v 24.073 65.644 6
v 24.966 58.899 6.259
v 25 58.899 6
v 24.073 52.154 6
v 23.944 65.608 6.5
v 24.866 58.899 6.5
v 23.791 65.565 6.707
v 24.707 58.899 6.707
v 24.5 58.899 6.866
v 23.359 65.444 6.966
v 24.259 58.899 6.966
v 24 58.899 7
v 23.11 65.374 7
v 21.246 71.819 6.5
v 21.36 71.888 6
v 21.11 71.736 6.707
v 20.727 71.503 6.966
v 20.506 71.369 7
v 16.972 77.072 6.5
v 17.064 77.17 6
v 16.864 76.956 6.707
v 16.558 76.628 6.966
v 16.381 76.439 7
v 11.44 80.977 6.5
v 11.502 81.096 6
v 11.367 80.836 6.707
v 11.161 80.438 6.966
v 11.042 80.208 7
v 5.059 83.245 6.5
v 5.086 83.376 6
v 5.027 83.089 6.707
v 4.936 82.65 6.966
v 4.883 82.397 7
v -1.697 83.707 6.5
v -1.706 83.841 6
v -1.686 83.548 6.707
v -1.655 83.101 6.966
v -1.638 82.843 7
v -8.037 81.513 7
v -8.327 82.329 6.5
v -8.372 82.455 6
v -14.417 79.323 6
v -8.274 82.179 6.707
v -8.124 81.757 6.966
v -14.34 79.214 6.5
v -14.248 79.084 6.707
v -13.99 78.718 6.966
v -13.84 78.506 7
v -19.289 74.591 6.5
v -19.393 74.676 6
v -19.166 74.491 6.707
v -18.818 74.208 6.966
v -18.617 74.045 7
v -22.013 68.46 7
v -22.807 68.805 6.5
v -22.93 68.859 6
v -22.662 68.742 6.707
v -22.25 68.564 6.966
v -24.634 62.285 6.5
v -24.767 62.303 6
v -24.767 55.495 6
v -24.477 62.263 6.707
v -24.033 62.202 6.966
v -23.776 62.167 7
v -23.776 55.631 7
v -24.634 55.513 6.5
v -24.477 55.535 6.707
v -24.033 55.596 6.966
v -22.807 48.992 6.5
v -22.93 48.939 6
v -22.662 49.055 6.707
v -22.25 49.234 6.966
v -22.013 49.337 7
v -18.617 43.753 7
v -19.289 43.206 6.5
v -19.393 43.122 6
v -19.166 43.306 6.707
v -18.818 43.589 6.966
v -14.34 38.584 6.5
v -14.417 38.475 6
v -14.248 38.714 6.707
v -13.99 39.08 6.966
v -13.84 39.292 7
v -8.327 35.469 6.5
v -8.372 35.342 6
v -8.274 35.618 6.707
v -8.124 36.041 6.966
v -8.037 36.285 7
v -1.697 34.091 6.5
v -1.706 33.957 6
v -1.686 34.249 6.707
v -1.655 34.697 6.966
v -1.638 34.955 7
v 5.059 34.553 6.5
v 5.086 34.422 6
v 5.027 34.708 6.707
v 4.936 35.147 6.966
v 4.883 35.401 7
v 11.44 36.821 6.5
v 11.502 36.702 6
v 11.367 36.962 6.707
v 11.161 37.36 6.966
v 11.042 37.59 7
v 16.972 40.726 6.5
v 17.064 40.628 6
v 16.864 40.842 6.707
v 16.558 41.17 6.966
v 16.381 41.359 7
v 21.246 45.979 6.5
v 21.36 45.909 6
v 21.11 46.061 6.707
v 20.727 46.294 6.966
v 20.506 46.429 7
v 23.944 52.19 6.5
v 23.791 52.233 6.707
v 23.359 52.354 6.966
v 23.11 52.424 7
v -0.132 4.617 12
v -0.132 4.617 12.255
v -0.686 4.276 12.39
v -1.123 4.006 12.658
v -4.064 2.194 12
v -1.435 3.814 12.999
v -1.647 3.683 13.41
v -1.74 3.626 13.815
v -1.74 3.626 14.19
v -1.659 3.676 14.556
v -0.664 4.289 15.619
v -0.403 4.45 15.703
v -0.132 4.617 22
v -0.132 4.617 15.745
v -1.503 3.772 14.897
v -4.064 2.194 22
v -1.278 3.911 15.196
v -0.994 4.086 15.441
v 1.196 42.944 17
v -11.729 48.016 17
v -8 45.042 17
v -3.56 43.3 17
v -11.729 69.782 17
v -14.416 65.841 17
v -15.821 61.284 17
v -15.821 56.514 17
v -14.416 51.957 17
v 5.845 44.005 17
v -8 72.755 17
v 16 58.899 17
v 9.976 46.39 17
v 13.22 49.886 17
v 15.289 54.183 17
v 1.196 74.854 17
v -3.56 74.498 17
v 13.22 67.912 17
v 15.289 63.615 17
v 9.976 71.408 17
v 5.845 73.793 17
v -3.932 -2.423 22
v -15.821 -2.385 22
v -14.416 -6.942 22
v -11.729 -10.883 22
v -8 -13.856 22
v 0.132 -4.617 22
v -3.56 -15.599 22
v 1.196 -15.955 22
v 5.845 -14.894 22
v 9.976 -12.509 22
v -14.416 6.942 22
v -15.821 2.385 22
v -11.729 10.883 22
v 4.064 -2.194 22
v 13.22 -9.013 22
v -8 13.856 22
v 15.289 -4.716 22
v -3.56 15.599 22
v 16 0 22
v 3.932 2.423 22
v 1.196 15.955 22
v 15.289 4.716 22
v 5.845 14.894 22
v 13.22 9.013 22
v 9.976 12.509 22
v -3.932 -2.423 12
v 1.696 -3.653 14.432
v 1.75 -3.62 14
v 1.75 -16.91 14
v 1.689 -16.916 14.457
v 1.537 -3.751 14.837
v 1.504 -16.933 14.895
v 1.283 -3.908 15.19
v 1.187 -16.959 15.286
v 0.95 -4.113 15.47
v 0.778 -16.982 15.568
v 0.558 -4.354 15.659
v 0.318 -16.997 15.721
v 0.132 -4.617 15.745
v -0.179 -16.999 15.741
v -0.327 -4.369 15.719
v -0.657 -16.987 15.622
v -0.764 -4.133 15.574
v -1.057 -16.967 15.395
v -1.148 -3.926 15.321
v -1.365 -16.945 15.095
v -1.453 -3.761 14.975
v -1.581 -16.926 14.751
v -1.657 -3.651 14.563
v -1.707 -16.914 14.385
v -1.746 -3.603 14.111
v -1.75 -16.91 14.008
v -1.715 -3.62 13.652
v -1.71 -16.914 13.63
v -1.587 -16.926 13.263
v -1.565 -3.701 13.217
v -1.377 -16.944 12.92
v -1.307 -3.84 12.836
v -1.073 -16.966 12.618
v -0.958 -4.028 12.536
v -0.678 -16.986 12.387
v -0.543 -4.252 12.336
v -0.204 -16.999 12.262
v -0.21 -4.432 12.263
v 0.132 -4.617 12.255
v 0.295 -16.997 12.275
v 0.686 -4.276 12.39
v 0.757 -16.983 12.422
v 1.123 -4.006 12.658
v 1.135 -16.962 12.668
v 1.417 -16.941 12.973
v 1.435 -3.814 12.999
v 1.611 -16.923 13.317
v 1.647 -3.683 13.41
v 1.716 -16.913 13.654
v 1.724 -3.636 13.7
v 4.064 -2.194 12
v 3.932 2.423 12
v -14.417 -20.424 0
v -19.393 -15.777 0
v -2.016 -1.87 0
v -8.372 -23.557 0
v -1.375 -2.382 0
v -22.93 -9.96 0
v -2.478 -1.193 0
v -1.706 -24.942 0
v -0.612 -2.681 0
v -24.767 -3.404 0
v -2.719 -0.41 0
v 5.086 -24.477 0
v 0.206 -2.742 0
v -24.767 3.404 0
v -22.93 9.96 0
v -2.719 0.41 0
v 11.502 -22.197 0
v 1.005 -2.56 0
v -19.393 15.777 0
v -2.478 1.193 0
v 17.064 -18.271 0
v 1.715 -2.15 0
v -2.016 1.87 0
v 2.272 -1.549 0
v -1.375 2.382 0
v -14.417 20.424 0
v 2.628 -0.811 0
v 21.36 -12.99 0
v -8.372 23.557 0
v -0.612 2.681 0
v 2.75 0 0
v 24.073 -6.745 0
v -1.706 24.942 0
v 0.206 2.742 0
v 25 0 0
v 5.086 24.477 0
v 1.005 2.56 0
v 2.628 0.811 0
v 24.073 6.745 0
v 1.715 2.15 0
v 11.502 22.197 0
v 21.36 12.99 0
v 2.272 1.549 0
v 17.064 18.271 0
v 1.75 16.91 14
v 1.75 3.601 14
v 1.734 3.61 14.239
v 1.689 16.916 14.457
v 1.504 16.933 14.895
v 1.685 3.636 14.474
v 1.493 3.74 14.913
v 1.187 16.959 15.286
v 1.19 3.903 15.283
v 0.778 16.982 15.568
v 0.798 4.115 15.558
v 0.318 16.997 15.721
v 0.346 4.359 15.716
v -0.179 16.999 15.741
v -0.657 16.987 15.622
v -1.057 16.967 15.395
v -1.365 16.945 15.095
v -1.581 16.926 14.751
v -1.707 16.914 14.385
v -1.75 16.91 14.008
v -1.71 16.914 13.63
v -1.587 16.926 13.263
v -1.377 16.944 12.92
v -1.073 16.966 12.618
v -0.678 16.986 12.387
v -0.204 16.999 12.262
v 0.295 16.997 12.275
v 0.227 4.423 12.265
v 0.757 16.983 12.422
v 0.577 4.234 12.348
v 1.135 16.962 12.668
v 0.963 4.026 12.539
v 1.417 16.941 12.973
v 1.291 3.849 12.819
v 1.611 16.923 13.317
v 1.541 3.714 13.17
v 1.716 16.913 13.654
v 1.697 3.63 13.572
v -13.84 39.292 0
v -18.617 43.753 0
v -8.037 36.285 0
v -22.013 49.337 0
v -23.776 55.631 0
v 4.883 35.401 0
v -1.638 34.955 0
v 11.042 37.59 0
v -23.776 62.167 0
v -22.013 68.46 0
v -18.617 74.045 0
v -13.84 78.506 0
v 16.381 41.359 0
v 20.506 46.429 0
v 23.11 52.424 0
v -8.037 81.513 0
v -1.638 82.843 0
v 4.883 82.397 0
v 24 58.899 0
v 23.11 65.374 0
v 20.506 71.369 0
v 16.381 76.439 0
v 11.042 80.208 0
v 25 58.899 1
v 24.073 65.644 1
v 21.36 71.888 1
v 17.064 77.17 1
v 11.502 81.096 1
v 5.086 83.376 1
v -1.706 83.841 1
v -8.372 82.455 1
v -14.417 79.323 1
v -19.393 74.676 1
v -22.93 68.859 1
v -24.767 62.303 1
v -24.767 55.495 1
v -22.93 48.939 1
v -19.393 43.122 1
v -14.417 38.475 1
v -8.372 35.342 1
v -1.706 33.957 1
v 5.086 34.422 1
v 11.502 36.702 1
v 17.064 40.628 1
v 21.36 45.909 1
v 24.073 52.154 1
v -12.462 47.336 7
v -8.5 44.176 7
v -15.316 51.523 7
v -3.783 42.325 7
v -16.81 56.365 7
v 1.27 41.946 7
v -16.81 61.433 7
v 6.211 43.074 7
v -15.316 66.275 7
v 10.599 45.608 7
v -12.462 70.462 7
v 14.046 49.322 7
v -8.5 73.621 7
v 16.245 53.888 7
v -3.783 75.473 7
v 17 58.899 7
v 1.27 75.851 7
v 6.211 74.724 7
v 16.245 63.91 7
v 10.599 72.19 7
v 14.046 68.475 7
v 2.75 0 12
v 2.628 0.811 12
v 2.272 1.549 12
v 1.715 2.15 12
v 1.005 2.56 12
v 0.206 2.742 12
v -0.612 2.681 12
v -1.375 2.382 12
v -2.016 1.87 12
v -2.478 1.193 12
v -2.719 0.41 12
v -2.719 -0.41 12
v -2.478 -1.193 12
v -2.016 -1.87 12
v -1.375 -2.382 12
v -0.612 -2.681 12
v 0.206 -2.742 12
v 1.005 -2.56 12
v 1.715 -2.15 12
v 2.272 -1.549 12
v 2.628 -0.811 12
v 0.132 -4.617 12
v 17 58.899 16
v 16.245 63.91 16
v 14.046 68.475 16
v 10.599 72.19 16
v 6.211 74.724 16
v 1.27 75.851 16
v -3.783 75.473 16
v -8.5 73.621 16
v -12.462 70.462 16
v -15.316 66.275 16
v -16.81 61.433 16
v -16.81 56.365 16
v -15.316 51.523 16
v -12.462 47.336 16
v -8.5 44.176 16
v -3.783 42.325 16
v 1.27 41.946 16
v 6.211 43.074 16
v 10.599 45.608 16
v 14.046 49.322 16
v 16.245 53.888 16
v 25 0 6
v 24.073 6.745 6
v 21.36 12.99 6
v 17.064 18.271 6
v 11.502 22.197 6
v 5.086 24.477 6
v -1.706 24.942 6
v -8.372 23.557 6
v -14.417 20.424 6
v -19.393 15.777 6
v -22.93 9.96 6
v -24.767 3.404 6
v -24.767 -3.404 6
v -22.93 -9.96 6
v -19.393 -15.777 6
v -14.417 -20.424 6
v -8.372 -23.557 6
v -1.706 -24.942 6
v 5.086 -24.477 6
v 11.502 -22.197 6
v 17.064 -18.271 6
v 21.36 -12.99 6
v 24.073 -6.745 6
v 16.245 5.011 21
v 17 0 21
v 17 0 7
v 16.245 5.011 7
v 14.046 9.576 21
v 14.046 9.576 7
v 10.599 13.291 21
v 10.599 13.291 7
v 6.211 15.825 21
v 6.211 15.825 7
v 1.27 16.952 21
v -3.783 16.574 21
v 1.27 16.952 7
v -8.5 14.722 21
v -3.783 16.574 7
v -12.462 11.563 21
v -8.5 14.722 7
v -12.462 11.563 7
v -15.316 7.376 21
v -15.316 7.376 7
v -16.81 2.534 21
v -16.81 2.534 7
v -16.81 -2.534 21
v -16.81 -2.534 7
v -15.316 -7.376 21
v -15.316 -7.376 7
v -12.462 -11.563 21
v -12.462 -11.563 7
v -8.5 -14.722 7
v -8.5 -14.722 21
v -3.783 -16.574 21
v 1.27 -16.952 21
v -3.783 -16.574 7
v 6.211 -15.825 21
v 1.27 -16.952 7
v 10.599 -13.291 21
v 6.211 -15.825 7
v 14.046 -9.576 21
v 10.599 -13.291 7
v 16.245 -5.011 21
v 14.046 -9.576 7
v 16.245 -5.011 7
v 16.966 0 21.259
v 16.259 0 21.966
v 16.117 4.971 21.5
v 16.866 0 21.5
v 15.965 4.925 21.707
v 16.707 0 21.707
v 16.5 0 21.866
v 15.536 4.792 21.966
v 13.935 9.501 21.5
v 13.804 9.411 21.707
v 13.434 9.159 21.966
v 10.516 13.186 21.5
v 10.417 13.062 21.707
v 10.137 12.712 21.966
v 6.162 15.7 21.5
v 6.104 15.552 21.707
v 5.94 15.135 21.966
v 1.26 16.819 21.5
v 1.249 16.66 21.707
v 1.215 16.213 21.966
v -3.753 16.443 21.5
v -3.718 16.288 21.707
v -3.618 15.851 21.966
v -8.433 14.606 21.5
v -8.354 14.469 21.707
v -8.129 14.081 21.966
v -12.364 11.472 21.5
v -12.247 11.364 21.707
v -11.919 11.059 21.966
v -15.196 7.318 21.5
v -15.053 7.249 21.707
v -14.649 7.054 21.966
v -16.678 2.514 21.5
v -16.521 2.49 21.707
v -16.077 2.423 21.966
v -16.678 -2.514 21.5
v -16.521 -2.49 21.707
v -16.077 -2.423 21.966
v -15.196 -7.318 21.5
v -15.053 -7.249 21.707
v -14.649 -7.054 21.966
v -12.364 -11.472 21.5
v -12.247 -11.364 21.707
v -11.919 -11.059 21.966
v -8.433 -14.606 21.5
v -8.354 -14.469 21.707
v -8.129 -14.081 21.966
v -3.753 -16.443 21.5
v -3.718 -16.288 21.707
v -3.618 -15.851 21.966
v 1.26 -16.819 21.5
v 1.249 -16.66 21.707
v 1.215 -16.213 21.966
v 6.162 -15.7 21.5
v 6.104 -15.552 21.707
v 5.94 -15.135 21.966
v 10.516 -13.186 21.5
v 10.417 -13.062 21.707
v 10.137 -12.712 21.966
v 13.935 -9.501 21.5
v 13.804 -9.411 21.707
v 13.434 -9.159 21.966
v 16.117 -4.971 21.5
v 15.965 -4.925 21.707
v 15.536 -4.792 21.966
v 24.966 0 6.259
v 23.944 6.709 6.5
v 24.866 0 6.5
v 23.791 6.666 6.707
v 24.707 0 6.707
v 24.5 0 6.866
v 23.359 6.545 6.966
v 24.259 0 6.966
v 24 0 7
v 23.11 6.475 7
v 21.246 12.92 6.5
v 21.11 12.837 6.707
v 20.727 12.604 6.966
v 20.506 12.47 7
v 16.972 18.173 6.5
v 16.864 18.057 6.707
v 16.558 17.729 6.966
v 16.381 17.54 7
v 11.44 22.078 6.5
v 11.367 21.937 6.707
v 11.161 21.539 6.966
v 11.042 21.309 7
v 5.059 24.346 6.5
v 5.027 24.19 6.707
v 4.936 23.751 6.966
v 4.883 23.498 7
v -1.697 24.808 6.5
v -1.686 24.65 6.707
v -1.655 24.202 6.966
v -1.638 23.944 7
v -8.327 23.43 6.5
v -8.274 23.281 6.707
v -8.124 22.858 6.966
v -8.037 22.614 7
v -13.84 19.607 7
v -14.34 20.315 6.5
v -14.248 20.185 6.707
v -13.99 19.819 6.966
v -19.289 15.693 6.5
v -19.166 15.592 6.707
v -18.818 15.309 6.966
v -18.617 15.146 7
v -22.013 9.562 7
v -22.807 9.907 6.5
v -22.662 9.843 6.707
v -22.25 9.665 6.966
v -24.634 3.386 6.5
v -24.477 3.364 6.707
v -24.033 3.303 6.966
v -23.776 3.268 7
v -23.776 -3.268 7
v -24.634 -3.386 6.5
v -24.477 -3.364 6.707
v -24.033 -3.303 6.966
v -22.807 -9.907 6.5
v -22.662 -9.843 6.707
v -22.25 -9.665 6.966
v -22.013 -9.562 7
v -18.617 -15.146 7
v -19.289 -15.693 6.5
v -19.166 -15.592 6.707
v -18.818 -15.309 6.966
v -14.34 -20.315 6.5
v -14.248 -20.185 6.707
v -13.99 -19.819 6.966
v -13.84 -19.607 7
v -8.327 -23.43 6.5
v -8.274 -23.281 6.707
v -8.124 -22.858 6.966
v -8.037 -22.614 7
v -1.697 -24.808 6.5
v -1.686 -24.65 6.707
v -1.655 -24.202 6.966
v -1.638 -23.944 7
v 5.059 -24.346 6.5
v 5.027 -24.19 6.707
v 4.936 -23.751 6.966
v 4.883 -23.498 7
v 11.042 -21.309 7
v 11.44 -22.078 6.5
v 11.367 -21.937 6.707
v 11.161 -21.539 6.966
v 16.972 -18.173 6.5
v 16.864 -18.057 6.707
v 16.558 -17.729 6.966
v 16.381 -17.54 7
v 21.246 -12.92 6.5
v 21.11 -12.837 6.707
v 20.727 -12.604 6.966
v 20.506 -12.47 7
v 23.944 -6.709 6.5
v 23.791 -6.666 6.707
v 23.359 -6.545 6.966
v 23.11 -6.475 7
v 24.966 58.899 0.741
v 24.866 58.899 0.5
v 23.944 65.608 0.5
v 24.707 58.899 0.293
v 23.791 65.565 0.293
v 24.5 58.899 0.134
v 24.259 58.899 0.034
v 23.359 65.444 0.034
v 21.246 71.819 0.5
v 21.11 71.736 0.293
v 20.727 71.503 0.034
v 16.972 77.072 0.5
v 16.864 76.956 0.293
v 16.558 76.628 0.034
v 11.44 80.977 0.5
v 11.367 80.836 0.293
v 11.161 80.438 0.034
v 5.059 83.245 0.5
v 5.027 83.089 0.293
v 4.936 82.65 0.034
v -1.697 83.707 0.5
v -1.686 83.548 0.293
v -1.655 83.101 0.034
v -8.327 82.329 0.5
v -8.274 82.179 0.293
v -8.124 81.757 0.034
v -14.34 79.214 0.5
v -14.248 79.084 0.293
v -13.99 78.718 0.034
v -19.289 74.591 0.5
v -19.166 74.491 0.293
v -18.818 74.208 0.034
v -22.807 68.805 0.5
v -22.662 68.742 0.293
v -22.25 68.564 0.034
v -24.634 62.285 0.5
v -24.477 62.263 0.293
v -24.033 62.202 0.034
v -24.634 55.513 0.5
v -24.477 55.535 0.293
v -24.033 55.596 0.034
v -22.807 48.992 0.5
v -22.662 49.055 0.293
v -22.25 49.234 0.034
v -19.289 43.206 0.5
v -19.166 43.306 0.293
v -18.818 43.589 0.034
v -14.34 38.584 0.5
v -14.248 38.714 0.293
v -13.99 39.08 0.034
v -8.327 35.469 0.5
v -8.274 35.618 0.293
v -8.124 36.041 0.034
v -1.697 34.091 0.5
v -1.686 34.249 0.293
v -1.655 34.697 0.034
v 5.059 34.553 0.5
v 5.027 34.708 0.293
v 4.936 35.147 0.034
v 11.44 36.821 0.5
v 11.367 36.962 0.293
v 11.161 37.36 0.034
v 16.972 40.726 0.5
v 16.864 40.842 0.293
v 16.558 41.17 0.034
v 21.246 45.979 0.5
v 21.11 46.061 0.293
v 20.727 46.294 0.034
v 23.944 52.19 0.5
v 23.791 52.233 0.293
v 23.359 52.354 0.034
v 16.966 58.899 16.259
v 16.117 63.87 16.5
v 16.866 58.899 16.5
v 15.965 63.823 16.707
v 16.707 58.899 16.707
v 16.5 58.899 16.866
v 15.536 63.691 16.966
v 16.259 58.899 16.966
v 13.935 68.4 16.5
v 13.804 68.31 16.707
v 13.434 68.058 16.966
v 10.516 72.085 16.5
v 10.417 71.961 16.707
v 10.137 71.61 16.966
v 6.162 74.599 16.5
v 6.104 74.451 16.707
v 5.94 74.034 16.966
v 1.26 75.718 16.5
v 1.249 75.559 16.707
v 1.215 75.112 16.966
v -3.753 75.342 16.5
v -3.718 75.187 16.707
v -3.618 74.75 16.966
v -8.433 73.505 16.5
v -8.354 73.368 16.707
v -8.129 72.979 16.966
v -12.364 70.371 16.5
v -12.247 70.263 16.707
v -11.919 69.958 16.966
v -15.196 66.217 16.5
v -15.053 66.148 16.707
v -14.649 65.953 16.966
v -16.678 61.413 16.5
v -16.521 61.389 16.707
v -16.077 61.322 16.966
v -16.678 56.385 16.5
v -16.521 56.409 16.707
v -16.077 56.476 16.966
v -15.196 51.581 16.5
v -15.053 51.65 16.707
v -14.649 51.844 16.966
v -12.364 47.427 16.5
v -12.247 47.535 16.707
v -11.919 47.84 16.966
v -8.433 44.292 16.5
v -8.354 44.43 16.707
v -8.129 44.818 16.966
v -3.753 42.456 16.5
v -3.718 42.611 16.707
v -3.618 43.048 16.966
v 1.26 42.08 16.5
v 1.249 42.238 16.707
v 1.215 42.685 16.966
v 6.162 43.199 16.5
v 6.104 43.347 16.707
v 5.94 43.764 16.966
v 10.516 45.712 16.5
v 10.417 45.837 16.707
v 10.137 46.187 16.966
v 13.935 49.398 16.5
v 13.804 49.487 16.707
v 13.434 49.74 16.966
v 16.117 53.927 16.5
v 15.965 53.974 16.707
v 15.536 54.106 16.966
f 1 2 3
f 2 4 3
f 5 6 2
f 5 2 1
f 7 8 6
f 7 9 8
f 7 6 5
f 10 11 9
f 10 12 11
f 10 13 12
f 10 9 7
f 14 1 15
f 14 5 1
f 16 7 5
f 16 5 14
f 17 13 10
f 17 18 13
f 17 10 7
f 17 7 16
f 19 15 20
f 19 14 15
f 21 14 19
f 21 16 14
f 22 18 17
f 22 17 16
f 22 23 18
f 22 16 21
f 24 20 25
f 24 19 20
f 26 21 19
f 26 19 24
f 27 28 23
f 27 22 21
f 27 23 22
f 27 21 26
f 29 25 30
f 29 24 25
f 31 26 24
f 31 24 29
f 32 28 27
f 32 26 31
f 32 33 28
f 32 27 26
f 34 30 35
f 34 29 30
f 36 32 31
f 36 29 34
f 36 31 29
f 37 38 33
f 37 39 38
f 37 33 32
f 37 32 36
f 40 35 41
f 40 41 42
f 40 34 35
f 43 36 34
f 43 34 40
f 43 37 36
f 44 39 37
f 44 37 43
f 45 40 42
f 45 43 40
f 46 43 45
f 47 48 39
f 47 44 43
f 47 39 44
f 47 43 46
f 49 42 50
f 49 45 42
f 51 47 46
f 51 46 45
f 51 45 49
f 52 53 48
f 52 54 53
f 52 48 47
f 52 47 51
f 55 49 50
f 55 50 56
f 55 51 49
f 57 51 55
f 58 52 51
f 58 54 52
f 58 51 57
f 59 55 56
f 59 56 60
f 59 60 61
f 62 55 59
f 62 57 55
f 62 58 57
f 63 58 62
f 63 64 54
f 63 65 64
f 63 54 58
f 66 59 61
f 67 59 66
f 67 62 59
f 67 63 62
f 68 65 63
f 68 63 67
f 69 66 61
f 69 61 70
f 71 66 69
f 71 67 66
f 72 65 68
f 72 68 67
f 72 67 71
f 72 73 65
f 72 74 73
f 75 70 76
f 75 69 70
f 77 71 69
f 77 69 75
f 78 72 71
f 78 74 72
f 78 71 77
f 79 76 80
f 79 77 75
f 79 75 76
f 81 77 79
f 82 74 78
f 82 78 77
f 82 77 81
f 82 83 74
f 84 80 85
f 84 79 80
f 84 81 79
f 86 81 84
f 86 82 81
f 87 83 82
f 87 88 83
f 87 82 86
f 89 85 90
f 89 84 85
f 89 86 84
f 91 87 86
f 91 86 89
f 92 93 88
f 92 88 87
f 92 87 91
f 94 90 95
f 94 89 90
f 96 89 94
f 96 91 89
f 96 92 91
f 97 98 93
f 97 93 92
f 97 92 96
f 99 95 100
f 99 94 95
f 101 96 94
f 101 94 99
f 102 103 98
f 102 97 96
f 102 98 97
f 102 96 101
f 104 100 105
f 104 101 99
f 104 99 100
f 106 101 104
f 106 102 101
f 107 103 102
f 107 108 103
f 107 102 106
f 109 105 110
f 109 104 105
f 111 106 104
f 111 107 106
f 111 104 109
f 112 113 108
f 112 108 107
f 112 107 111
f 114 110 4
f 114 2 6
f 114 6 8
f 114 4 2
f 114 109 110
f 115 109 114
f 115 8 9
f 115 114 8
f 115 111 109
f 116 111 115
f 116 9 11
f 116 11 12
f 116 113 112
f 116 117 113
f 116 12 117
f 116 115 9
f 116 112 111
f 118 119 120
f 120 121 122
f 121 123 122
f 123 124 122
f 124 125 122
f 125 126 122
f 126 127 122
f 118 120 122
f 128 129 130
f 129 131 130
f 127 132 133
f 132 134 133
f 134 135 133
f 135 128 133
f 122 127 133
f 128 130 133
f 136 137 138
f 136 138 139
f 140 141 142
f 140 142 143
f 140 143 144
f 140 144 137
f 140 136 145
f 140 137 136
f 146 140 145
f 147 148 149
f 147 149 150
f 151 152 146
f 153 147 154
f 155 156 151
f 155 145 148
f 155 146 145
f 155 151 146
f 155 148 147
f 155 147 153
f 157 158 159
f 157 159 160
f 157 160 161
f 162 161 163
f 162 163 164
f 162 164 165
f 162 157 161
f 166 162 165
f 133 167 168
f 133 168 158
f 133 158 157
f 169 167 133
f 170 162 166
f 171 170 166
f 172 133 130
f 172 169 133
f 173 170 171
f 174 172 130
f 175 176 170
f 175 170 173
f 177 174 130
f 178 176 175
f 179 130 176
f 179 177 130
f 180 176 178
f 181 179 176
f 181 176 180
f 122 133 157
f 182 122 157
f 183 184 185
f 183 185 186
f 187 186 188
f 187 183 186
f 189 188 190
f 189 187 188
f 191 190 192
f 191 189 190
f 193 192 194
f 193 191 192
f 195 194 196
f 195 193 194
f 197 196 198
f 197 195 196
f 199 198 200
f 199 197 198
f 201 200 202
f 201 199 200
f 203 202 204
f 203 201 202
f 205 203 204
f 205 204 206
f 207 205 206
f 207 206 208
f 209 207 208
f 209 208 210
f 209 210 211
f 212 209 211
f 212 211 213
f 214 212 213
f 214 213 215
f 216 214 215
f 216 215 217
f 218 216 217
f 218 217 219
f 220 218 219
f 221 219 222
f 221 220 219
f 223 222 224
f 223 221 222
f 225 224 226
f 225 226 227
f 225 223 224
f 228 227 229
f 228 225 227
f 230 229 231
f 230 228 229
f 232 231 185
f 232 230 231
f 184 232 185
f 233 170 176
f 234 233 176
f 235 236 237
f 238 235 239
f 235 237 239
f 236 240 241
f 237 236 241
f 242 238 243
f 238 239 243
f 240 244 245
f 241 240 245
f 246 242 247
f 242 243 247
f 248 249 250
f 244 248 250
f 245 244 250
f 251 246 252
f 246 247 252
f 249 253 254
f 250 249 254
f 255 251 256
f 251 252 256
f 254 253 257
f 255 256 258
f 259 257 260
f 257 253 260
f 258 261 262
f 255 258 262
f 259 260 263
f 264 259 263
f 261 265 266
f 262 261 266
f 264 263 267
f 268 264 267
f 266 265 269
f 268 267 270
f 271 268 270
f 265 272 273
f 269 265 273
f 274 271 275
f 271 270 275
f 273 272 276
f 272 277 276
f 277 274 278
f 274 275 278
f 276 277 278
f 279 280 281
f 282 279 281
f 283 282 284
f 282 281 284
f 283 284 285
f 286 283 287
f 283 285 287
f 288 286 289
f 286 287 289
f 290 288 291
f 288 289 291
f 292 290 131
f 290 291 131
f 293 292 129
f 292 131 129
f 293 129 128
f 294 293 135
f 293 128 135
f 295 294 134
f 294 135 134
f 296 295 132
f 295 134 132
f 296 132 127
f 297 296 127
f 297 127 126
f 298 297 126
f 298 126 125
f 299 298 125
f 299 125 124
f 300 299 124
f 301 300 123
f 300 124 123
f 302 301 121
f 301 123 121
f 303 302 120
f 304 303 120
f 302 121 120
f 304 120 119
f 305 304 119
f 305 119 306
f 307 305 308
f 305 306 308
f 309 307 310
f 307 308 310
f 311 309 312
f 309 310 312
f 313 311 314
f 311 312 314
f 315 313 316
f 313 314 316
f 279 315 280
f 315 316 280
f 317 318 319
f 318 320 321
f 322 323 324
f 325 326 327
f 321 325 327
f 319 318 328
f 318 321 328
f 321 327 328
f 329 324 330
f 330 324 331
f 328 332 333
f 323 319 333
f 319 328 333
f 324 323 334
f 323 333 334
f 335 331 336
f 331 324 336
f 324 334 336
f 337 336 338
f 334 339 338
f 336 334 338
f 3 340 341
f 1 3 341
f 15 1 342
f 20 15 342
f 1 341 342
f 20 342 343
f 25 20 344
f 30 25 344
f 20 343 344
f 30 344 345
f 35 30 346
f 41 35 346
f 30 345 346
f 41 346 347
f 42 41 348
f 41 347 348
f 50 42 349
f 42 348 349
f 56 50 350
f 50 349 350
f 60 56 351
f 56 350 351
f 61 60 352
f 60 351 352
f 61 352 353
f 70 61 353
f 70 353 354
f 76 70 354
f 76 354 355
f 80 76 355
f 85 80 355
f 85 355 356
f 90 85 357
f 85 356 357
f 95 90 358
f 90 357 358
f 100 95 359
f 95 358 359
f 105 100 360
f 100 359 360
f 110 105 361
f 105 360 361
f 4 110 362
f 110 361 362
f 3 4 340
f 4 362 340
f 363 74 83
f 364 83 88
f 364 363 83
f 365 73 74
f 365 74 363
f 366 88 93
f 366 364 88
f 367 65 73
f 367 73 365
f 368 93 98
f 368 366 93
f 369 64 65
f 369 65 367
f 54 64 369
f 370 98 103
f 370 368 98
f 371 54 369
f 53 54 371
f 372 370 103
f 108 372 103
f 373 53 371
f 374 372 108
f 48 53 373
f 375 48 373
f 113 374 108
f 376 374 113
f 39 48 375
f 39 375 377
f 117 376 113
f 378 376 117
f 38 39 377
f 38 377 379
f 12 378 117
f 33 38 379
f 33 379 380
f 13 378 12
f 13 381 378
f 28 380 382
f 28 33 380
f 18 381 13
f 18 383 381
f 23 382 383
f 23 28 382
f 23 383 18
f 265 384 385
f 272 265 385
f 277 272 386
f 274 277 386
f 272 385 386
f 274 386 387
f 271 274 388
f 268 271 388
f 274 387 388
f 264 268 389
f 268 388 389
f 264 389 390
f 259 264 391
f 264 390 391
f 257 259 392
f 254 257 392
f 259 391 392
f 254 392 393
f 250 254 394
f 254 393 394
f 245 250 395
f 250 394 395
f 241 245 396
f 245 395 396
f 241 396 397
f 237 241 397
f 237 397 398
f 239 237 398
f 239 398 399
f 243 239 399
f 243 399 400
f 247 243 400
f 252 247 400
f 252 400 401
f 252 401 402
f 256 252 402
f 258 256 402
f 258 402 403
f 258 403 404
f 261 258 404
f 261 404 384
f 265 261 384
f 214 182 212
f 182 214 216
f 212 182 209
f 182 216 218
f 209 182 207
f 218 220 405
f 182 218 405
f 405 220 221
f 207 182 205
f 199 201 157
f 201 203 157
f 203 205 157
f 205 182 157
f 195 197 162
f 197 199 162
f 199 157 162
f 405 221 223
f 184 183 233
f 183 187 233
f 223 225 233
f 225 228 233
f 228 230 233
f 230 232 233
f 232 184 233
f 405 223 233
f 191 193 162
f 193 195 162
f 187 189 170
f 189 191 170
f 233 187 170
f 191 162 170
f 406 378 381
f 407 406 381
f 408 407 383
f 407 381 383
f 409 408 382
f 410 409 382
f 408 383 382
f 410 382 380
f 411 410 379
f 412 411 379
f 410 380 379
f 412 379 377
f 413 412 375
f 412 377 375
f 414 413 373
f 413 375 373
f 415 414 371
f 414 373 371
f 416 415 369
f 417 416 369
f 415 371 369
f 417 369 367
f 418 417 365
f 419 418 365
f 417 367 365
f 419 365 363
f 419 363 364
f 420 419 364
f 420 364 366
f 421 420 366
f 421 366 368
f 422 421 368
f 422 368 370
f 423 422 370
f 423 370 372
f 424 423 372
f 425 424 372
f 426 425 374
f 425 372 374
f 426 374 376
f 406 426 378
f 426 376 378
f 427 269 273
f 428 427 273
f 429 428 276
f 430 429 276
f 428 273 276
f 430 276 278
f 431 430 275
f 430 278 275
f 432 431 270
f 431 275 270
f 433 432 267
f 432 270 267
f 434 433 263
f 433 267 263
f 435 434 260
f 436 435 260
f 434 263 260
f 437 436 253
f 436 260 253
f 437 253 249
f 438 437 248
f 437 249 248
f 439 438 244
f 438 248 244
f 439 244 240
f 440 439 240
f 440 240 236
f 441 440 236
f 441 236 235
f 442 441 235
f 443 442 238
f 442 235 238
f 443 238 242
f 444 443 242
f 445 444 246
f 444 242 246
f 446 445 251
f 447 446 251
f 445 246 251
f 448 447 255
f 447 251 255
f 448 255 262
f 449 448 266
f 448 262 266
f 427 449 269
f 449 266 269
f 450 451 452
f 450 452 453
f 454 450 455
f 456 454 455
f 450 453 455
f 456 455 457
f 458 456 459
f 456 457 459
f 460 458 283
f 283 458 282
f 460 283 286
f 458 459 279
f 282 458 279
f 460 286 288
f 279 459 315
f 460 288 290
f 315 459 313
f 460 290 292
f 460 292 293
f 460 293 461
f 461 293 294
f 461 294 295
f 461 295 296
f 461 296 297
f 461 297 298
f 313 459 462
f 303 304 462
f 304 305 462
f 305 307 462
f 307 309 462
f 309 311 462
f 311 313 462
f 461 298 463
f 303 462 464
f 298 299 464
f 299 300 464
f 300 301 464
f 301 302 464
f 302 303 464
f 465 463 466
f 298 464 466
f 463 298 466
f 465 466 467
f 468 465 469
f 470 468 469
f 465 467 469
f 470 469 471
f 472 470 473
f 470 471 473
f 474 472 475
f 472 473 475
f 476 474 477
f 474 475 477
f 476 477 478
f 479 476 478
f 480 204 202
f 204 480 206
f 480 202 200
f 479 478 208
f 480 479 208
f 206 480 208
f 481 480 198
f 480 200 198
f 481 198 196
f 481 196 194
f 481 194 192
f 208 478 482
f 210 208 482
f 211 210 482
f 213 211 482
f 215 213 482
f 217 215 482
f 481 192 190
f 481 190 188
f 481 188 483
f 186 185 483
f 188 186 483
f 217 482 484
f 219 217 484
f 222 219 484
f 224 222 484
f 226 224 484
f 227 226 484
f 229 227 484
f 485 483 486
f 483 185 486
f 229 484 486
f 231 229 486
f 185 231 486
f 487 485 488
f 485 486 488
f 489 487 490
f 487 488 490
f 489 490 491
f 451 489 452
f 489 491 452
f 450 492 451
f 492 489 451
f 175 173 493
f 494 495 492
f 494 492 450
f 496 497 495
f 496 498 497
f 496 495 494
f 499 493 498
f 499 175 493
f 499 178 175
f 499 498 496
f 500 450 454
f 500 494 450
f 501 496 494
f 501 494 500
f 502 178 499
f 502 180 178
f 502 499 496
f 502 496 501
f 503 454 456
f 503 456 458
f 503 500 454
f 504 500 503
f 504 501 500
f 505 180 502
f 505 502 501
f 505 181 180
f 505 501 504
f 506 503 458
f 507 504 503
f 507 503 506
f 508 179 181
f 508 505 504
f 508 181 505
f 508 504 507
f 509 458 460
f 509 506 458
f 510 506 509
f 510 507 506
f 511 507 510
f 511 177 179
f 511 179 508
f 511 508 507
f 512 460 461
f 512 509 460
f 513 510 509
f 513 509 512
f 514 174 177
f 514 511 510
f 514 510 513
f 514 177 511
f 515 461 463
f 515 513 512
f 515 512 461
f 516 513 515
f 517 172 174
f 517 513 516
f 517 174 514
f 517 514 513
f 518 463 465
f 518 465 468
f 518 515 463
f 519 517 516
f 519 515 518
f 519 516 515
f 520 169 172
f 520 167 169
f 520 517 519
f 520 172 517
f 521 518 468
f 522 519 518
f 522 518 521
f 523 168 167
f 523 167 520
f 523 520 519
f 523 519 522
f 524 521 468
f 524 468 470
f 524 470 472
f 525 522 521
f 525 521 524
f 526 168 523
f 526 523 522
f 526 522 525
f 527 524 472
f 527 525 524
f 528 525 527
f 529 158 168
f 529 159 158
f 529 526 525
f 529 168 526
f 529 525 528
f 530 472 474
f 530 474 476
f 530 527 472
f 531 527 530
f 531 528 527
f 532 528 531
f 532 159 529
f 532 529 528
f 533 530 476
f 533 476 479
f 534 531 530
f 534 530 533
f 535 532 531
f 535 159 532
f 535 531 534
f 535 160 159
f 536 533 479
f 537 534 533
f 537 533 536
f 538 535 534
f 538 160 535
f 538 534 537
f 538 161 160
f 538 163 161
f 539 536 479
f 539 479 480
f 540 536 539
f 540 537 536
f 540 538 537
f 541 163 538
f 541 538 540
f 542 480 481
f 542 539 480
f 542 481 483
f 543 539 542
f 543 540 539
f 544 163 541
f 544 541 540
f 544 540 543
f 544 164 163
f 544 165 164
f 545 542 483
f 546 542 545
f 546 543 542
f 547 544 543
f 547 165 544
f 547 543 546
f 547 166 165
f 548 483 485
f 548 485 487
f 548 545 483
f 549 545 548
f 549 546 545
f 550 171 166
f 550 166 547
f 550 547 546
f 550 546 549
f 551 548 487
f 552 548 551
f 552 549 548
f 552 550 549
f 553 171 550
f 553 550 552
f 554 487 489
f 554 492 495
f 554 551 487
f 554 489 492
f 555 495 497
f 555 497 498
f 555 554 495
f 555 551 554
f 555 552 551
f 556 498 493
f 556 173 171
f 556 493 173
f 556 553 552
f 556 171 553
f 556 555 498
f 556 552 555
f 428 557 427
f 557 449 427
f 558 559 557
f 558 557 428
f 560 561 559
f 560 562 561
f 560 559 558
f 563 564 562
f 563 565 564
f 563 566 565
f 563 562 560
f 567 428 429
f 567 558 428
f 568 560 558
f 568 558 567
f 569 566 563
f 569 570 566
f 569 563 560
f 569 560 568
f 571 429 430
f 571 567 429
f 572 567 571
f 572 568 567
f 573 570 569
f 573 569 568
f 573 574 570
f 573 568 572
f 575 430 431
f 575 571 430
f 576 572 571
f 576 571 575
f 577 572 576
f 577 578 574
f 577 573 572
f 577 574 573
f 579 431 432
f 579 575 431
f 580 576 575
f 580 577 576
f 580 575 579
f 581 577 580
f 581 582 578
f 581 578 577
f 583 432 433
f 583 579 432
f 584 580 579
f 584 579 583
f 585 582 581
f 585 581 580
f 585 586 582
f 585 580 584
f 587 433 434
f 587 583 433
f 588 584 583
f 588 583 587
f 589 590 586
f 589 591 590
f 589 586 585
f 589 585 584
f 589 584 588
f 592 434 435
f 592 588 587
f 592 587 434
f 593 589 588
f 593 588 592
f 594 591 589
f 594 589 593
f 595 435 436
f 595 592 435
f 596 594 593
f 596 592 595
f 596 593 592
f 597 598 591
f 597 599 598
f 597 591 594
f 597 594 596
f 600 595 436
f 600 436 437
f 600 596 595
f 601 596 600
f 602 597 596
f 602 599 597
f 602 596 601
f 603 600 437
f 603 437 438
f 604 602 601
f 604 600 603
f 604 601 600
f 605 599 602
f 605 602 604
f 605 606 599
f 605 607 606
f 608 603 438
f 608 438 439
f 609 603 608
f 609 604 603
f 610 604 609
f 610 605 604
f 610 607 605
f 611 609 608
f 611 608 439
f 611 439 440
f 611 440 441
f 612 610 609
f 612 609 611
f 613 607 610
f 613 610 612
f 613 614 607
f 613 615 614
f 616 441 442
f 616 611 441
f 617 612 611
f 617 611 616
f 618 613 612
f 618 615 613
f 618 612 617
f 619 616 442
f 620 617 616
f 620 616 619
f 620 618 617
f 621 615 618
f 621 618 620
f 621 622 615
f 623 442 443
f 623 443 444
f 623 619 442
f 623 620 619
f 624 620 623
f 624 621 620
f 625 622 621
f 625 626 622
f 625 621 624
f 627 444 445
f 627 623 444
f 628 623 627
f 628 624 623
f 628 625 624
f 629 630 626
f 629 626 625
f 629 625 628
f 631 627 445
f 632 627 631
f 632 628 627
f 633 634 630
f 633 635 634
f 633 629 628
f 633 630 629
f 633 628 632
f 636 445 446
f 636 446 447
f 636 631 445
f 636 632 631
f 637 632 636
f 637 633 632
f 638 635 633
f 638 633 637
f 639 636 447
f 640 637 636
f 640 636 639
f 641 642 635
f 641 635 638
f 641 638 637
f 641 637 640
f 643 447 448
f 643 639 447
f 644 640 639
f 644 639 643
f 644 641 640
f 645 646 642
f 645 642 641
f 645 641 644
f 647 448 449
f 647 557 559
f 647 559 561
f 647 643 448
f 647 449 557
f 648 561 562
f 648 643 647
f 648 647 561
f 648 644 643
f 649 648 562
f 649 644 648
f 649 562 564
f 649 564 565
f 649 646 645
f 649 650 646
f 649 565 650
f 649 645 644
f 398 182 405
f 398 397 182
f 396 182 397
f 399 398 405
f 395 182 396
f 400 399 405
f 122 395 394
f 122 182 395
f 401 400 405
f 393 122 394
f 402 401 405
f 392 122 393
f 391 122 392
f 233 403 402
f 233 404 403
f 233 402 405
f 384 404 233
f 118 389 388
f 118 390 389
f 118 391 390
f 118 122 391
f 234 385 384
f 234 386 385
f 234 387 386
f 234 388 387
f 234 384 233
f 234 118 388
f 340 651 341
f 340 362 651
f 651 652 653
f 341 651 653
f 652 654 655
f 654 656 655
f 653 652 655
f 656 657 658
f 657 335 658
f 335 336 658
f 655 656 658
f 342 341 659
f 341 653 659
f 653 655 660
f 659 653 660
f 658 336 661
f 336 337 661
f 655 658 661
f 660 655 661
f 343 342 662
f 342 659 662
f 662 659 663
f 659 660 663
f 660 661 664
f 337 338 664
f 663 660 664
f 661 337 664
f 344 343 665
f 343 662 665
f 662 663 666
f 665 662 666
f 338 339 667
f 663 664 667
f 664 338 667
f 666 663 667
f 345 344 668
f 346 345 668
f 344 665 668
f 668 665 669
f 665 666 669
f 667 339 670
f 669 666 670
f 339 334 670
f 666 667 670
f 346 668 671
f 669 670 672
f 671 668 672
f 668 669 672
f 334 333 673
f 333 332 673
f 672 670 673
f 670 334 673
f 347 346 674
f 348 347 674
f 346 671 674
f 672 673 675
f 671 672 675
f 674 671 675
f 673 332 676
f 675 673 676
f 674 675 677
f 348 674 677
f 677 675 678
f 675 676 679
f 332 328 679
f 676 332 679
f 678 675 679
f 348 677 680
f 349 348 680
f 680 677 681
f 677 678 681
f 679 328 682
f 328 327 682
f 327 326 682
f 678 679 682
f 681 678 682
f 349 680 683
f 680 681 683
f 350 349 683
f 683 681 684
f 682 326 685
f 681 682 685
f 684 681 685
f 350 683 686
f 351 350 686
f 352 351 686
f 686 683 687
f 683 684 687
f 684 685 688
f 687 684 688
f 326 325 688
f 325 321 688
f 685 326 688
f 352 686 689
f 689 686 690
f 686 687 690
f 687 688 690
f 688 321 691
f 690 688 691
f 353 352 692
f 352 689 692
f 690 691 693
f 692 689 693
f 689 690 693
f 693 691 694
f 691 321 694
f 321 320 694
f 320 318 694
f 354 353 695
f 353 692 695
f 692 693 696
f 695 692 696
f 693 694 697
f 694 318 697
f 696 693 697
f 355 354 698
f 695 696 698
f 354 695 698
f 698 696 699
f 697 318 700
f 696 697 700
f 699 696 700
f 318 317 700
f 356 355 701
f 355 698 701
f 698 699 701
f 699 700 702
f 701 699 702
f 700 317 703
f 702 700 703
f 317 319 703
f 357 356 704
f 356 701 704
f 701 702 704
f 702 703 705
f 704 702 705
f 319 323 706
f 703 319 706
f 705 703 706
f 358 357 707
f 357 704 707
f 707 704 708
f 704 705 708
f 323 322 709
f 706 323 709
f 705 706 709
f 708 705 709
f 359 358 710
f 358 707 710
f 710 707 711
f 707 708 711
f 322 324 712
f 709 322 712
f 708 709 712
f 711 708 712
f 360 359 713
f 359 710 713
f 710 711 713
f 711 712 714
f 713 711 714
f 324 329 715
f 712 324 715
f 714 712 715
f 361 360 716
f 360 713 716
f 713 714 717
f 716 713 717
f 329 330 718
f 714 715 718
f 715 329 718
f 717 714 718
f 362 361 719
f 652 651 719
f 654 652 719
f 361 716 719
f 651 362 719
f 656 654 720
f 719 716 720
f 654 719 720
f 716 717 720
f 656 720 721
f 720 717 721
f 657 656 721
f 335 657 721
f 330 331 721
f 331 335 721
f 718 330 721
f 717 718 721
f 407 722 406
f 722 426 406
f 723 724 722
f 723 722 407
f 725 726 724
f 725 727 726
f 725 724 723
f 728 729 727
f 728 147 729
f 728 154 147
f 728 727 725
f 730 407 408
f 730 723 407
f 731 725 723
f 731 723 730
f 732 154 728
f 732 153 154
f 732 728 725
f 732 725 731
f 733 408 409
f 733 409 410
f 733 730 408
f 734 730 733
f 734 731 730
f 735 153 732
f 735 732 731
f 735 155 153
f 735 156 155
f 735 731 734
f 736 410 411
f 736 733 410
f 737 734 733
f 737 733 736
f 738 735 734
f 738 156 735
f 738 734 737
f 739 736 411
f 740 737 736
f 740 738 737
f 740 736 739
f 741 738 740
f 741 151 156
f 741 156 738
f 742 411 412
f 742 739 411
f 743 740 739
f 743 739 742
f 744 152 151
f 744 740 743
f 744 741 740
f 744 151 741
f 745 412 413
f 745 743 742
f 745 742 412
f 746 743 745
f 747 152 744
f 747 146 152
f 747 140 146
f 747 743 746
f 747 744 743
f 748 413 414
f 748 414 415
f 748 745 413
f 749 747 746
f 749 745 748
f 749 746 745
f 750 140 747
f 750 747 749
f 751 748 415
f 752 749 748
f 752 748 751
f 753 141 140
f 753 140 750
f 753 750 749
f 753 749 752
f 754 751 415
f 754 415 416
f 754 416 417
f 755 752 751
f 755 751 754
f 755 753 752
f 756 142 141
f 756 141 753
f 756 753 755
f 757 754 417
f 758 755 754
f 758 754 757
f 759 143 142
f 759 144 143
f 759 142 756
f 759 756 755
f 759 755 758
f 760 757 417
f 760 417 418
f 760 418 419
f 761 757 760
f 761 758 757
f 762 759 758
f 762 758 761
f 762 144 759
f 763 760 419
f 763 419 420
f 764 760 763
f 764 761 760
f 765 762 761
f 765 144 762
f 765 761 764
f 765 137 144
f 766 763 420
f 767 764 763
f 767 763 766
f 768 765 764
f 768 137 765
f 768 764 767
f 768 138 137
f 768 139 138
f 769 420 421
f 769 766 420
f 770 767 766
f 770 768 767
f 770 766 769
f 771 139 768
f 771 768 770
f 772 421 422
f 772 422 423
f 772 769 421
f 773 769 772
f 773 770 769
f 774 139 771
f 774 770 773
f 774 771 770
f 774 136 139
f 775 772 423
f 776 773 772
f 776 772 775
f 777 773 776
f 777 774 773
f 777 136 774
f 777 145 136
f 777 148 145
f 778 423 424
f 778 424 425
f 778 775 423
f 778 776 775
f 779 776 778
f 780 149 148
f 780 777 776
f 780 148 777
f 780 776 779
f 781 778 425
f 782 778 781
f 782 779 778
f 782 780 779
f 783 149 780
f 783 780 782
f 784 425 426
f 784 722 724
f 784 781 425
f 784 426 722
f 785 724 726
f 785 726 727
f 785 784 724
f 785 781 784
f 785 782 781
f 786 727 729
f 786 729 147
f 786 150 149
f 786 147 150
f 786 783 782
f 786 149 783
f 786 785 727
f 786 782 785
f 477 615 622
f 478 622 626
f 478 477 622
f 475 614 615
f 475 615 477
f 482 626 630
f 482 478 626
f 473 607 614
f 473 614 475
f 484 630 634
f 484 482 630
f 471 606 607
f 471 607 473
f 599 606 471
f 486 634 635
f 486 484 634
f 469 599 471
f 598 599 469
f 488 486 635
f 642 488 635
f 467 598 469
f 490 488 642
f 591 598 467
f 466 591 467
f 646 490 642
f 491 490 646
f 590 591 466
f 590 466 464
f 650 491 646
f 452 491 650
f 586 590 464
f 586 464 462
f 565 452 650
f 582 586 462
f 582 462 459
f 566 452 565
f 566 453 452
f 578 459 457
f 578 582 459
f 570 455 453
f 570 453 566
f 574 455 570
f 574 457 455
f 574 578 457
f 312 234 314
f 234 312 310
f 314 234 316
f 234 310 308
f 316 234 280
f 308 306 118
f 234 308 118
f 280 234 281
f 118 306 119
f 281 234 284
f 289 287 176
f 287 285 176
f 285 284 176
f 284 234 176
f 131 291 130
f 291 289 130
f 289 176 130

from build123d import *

# Parameters (mm, degrees)
F0_R           = 25
F2_DEPTH       = 7
F1_R           = 25
F3_R           = 17
F4_DEPTH       = 15
F6_DEPTH       = 10
F7_R           = 2.75
F8_DEPTH       = 25
F9_R           = 1
F10_R          = 1.75
F11_DEPTH      = 25
F11_DEPTH_BACK = 25
F12_R          = 17
F13_DEPTH      = 10
F14_R          = 1


with BuildPart() as f2:
    # F0 (on Top) → F2 (new body)
    with BuildSketch(Plane.XY):
        Circle(F0_R)
    extrude(amount=F2_DEPTH)

    # F3 (on face) → F4 (join)
    with BuildSketch(Plane.XY.offset(7)):
        Circle(F3_R)
    extrude(amount=F4_DEPTH)

    # F5 (on face) → F6 (cut)
    with BuildSketch(Plane.XY.offset(22)):
        Polygon((-0.1320335268, 4.6169146062), (-4.0643820995, 2.1941129147), (-3.9323485727, -2.4228016915), (0.1320335268, -4.6169146062), (4.0643820995, -2.1941129147), (3.9323485727, 2.4228016915), align=None)
    extrude(amount=-F6_DEPTH, mode=Mode.SUBTRACT)

    # F7 (on face) → F8 (cut)
    with BuildSketch(Plane.XY.offset(12)):
        Circle(F7_R)
    extrude(amount=-F8_DEPTH, mode=Mode.SUBTRACT)

    # F9
    f9_edges = [f2.edges().sort_by_distance(p)[0] for p in [
        (-25, 0, 7),
        (-17, 0, 22),
    ]]
    fillet(f9_edges, radius=F9_R)

    # F10 (on Front) → F11 (cut, two sides)
    with BuildSketch(Plane.XZ) as f11_sk:
        with Locations((0, 14)):
            Circle(F10_R)
    extrude(amount=-F11_DEPTH, mode=Mode.SUBTRACT)
    extrude(f11_sk.sketch, amount=F11_DEPTH_BACK, mode=Mode.SUBTRACT)


with BuildPart() as f2b:
    # F1 (on Top) → F2, piece 2 (new body)
    with BuildSketch(Plane.XY):
        with Locations((0, 58.8988291364)):
            Circle(F1_R)
    extrude(amount=F2_DEPTH)

    # F12 (on face) → F13 (join)
    with BuildSketch(Plane.XY.offset(7)):
        with Locations((0, 58.8988291364)):
            Circle(F12_R)
    extrude(amount=F13_DEPTH)

    # F14
    f14_edges = [f2b.edges().sort_by_distance(p)[0] for p in [
        (-17, 58.898829, 17),
        (-25, 58.898829, 7),
        (-25, 58.898829, 0),
    ]]
    fillet(f14_edges, radius=F14_R)


solid = Compound([f2.part, f2b.part])
